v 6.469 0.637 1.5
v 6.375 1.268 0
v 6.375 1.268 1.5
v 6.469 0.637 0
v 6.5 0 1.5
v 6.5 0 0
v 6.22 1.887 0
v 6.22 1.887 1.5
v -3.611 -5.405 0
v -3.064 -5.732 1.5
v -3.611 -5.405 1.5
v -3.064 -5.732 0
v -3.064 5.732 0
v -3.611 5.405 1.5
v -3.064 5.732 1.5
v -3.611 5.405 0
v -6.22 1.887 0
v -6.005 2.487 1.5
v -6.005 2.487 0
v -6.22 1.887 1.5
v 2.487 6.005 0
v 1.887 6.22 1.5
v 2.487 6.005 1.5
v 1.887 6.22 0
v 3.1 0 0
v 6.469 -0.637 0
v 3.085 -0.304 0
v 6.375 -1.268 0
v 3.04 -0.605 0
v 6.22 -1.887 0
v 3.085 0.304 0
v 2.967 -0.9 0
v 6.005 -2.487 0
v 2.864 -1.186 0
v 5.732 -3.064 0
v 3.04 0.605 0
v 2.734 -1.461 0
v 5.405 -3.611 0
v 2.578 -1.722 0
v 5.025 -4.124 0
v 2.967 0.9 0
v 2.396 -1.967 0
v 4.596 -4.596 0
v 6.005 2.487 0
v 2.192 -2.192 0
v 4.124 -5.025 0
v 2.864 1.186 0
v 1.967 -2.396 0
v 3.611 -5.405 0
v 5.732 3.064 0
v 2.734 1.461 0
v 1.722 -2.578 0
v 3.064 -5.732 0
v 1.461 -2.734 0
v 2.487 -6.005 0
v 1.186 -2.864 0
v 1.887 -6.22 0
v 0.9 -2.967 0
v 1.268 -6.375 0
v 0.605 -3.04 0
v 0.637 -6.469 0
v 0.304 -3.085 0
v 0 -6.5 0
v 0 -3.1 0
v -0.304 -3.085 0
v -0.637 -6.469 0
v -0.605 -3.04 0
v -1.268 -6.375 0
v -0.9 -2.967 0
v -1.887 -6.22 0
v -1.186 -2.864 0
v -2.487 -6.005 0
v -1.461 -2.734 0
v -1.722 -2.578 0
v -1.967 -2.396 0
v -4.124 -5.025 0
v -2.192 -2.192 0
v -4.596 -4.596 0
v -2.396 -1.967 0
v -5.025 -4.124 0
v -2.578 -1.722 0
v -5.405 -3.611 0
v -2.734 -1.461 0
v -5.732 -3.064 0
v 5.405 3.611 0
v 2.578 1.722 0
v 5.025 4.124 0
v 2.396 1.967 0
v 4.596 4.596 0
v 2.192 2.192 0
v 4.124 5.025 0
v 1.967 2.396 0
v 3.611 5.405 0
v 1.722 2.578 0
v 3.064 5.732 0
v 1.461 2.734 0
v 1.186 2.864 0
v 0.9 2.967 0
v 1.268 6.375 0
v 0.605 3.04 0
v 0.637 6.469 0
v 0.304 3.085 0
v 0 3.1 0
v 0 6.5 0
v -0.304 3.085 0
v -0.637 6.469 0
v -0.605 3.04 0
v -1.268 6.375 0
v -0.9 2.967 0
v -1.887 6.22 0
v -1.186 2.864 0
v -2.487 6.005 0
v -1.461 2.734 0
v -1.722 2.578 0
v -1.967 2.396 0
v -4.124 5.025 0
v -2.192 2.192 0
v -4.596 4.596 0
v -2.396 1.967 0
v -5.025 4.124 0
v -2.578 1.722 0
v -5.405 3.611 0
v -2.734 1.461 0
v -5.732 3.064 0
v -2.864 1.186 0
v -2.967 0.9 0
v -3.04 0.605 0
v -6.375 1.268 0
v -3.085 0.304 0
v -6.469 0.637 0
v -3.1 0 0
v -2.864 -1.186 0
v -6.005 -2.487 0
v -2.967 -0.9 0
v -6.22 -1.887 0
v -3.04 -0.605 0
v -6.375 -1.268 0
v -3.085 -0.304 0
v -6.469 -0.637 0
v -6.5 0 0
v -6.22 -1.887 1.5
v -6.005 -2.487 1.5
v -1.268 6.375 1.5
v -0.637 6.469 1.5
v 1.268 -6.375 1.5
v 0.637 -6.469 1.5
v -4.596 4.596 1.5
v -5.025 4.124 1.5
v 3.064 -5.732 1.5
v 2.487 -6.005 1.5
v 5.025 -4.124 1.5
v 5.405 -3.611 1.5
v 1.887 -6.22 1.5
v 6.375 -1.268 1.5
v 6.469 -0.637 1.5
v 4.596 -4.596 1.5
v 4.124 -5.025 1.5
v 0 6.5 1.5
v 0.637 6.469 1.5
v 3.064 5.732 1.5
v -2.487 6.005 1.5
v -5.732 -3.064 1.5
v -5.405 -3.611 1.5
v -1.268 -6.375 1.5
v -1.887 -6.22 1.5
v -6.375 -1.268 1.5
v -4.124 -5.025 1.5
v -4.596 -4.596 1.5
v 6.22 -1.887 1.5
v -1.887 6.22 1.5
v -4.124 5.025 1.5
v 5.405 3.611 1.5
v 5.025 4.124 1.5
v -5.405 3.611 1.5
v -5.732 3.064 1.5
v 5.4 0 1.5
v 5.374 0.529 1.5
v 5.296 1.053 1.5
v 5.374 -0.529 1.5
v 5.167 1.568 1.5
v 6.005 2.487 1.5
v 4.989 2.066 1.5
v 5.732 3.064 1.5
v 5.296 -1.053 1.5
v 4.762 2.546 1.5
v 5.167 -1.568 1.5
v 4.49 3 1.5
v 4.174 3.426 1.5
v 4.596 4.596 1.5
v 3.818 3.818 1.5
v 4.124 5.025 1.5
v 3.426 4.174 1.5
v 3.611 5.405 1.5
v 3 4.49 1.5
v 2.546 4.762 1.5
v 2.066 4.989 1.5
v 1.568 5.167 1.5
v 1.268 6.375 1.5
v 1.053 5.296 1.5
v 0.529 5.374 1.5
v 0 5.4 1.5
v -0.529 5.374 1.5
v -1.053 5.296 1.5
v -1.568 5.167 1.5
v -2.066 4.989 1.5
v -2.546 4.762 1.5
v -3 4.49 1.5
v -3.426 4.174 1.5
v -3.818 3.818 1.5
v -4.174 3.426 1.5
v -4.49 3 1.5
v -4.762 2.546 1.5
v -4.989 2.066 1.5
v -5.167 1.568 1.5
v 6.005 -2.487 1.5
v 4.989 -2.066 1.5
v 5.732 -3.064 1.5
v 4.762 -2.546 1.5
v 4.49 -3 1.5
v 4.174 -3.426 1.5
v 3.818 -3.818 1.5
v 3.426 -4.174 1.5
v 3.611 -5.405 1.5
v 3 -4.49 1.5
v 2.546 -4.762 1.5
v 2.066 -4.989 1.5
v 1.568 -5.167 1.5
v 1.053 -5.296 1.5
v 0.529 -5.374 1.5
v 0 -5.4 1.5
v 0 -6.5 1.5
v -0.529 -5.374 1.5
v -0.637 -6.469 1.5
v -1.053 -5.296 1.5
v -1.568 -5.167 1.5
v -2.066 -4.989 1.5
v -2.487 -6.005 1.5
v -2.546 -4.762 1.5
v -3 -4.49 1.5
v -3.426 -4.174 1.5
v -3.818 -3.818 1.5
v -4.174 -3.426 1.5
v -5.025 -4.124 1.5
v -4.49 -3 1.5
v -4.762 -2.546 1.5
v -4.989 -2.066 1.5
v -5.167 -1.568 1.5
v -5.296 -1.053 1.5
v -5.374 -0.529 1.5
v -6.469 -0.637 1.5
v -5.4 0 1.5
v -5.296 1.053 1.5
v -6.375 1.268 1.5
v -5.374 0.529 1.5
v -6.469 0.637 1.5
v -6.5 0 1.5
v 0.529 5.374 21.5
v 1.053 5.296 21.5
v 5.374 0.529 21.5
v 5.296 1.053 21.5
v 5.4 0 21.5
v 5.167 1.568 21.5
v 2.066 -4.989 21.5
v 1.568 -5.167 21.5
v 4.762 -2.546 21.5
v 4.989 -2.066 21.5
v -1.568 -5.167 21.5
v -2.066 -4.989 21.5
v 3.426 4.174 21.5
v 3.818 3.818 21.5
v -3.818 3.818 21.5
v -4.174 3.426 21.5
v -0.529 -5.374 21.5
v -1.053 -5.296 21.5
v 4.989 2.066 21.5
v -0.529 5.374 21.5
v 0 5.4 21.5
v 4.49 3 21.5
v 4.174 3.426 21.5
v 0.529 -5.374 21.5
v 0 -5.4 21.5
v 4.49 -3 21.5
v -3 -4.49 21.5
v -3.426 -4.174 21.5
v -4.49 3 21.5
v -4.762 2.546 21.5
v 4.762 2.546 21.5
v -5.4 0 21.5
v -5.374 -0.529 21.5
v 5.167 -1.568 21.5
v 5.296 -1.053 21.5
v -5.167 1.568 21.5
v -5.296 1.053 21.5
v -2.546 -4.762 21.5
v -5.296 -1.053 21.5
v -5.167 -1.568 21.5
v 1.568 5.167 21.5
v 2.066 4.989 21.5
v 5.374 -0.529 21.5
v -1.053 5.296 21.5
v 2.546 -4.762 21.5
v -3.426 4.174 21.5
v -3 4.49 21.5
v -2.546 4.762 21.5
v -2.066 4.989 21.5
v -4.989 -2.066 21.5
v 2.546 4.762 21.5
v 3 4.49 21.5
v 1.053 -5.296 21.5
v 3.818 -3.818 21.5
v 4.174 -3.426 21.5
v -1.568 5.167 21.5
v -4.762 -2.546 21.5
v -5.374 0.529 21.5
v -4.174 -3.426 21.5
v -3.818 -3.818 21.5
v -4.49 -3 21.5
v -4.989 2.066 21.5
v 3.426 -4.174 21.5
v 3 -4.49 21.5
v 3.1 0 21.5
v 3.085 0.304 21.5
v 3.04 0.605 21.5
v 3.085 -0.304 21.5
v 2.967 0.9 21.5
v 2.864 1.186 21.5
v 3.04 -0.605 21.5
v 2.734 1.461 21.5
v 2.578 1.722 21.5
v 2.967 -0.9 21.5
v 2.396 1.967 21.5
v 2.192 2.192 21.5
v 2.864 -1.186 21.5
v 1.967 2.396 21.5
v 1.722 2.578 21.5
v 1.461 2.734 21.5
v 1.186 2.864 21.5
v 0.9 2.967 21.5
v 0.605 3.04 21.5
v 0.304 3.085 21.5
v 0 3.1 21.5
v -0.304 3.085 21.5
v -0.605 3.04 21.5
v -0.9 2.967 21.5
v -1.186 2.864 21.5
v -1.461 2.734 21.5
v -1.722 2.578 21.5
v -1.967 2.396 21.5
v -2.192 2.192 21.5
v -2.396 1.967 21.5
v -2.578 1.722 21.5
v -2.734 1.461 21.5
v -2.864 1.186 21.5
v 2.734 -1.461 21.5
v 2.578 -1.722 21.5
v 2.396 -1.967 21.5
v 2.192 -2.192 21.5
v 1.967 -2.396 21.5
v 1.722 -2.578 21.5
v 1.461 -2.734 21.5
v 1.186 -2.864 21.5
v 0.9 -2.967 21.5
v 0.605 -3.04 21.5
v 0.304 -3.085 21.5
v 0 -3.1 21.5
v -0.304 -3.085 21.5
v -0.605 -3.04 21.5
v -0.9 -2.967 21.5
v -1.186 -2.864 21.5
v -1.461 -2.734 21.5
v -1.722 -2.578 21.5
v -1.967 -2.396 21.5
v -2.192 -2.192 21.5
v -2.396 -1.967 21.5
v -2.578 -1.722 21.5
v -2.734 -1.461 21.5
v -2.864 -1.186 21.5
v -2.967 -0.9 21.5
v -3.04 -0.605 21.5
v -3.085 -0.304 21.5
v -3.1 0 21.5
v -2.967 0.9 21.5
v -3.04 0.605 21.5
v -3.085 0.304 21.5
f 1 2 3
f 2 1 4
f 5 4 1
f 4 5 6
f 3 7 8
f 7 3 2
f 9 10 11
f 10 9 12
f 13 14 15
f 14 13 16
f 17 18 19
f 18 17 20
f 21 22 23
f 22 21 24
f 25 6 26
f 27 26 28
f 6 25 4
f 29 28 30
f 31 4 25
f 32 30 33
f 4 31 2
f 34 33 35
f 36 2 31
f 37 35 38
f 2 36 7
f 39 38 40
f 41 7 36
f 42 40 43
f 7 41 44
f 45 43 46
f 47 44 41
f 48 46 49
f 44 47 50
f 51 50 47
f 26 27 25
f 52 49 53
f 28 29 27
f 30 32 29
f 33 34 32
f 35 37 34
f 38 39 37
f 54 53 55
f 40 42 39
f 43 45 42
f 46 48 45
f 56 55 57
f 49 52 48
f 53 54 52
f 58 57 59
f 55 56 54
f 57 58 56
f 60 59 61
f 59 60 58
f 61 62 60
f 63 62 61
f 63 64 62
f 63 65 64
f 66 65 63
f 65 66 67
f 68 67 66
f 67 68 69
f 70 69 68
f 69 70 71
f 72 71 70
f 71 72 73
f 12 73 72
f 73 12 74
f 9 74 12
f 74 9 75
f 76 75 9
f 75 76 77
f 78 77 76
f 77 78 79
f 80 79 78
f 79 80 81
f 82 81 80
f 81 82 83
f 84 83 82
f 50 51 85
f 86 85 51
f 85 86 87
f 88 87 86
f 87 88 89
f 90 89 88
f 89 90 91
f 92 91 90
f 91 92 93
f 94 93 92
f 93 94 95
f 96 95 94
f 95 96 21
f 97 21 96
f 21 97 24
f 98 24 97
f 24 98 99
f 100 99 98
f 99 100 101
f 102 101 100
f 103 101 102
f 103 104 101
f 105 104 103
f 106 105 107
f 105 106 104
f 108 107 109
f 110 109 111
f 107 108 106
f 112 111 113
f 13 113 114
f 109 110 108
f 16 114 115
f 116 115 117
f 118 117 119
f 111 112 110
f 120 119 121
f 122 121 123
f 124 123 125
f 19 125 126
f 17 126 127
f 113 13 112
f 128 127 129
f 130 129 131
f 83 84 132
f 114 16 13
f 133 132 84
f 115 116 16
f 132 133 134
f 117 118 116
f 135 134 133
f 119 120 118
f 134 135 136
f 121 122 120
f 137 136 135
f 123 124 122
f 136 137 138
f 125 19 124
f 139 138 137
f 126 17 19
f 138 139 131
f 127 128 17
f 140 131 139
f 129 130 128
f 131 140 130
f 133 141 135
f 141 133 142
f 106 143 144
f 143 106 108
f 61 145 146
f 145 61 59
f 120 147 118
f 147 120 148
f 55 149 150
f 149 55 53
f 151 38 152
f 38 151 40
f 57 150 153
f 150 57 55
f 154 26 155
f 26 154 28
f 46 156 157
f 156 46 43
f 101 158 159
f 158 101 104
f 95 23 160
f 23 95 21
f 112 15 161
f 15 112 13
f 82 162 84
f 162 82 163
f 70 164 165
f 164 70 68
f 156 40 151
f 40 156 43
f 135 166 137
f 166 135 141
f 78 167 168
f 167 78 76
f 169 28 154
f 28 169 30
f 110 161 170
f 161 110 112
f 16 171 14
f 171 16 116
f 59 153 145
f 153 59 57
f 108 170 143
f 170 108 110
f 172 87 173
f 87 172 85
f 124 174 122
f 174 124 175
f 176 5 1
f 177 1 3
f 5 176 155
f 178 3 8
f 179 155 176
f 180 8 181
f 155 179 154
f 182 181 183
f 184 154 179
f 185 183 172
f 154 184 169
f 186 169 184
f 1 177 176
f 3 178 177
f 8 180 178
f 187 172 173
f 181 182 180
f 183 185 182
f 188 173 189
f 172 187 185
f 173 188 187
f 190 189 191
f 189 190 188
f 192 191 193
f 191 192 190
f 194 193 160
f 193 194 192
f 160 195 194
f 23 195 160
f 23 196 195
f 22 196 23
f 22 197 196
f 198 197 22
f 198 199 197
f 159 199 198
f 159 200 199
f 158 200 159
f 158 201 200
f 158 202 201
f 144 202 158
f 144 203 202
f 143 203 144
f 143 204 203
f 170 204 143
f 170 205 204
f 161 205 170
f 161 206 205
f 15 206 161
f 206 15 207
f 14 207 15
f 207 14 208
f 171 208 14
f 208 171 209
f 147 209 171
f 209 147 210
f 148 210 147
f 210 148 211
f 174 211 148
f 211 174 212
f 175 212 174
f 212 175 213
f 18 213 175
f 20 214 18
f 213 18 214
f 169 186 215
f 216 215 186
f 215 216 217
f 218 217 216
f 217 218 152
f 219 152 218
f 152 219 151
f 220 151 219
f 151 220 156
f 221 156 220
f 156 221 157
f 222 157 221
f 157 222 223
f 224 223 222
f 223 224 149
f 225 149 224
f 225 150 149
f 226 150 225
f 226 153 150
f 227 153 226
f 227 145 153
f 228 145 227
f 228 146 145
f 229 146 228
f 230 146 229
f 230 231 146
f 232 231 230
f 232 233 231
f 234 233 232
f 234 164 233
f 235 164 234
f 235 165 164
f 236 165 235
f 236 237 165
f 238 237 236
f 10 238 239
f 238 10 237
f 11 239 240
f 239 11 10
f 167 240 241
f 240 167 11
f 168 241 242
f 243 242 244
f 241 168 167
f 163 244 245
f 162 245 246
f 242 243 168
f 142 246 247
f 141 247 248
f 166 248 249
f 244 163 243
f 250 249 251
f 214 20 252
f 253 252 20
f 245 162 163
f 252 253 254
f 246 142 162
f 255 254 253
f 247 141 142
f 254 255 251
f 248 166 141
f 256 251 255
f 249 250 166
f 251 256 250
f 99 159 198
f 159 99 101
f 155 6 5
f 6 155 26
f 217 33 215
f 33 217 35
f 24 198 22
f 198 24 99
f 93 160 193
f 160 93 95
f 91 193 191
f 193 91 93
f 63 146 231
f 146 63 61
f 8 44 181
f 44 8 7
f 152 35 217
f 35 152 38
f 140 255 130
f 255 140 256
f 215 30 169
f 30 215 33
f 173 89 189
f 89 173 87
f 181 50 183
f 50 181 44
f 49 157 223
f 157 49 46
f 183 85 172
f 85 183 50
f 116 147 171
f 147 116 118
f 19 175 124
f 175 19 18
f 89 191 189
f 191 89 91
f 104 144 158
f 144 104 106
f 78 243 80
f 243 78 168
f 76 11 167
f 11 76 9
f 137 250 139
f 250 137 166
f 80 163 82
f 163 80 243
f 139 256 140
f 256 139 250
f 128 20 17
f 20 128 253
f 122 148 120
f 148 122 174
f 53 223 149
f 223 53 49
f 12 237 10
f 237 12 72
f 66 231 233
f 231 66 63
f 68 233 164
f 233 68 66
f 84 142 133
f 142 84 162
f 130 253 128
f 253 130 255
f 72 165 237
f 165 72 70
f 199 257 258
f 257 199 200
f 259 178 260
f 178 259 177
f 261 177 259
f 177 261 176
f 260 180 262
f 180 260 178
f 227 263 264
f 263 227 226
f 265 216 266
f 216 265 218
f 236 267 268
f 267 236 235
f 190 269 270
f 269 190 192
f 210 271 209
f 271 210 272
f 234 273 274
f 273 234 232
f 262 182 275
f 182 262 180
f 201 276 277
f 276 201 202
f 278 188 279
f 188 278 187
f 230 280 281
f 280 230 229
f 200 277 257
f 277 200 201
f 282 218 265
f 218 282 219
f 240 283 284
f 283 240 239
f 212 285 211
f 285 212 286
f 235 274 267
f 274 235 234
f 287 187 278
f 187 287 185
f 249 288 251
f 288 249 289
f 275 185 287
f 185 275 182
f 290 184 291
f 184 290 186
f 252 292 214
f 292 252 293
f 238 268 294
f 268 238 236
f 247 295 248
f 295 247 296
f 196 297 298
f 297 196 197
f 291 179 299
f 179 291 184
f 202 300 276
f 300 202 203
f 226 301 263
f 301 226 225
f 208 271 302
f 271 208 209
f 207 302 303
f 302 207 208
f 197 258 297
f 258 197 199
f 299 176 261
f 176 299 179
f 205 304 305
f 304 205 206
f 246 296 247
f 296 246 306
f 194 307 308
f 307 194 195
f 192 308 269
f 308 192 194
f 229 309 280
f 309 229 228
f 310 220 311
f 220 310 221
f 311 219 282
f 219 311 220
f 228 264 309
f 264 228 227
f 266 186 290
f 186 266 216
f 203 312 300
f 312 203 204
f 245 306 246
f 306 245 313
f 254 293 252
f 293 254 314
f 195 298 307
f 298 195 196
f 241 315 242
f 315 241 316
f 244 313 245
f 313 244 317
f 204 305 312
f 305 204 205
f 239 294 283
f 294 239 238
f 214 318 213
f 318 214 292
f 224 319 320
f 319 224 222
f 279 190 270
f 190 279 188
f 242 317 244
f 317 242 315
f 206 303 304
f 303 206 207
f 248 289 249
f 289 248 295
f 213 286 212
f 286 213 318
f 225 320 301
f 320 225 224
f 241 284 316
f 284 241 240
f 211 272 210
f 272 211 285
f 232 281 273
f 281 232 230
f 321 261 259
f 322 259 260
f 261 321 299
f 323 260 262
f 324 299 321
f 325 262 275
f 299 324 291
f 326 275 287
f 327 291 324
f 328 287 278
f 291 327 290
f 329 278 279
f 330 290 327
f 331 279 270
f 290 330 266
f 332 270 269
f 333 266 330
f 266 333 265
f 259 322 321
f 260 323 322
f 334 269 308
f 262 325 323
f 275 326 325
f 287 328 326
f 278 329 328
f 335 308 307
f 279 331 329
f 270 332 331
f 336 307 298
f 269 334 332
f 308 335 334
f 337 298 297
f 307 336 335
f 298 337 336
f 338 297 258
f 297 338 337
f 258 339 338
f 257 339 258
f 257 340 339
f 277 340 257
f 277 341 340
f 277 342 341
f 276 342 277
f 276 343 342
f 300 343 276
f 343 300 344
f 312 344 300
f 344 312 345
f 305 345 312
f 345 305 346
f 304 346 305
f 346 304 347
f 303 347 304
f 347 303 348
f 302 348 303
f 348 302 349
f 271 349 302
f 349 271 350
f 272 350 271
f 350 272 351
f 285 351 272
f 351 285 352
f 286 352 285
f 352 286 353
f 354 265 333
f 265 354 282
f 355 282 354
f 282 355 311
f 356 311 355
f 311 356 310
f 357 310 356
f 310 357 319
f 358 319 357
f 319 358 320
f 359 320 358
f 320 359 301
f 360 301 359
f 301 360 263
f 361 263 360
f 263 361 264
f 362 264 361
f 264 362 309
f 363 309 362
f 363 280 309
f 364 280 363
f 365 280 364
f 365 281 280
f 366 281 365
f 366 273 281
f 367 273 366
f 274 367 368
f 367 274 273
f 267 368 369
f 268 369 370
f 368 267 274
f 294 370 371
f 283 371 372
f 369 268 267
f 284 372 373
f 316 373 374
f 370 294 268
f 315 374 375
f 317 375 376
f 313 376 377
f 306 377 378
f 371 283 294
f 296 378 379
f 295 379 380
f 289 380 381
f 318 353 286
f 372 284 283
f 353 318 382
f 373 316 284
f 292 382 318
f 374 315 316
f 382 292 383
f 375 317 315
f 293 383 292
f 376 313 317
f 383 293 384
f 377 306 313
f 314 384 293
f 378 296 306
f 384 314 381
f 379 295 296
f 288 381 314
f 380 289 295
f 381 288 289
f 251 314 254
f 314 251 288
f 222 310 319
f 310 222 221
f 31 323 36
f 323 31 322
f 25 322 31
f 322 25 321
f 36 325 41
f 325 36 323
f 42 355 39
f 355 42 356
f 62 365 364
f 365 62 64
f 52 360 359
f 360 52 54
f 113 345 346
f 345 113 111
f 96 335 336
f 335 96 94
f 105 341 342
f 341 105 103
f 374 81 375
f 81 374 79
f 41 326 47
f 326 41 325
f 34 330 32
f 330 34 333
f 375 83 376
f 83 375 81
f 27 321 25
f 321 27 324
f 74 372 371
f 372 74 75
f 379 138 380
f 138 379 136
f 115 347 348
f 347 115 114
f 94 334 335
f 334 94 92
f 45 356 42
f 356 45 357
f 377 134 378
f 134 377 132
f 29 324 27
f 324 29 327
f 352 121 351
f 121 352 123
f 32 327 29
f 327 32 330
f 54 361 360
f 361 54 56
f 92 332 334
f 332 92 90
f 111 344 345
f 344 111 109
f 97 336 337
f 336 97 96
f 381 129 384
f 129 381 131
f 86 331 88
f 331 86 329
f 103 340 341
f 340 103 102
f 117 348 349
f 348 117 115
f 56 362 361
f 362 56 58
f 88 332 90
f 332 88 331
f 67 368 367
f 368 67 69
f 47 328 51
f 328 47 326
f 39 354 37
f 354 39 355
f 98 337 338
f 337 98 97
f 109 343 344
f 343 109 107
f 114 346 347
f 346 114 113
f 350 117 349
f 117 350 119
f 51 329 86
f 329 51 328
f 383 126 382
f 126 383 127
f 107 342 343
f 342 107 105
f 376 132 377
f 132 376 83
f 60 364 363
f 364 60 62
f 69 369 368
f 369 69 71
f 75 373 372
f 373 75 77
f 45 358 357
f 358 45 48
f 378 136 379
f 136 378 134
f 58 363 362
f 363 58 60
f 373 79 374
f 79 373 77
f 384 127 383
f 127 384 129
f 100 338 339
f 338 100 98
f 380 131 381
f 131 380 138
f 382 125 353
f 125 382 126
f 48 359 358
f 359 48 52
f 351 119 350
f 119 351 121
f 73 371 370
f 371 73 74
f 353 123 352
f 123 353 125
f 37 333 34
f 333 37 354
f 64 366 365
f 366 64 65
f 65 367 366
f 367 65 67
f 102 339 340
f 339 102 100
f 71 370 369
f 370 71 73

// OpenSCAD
// Adapter sleeve: 0.2 mL PCR tube into a 1.5 mL rack hole
// Print orientation: collar on bed (z = 0..1.5), sleeve body rising to z = 21.5

$fn = 64;

// ---- Dimensions (mm) ----
collar_dia   = 13.0;   // outer diameter of the bed collar
collar_thk   = 1.5;    // collar thickness (z = 0 to 1.5)
body_od      = 10.8;   // outer diameter of the sleeve body
body_top_z   = 21.5;   // top of the sleeve body (full height)
bore_dia     = 6.2;    // straight through-bore diameter

// ---- Derived radii ----
collar_r = collar_dia / 2;   // 6.5
body_r   = body_od  / 2;     // 5.4
bore_r   = bore_dia / 2;     // 3.1

// ---- Solid ----
// Collar: 13 mm dia, 1.5 mm thick, resting on the bed (z = 0..1.5)
module collar() { cylinder(h = collar_thk, d = collar_dia, $fn = $fn); }

// Sleeve body: 10.8 mm OD, rising from the collar top (z = 1.5) to z = 21.5
module body() { translate([0, 0, collar_thk])
    cylinder(h = body_top_z - collar_thk, d = body_od, $fn = $fn); }

// Bore: 6.2 mm dia, straight, open at both ends.
// Extend 1 mm past each face so no cut face is exactly coplanar.
module bore() { translate([0, 0, -1])
    cylinder(h = body_top_z + 2, d = bore_dia, $fn = $fn); }

// Final part: collar + body, minus the through-bore
difference() {
    union() {
        collar();
        body();
    }
    bore();
}
